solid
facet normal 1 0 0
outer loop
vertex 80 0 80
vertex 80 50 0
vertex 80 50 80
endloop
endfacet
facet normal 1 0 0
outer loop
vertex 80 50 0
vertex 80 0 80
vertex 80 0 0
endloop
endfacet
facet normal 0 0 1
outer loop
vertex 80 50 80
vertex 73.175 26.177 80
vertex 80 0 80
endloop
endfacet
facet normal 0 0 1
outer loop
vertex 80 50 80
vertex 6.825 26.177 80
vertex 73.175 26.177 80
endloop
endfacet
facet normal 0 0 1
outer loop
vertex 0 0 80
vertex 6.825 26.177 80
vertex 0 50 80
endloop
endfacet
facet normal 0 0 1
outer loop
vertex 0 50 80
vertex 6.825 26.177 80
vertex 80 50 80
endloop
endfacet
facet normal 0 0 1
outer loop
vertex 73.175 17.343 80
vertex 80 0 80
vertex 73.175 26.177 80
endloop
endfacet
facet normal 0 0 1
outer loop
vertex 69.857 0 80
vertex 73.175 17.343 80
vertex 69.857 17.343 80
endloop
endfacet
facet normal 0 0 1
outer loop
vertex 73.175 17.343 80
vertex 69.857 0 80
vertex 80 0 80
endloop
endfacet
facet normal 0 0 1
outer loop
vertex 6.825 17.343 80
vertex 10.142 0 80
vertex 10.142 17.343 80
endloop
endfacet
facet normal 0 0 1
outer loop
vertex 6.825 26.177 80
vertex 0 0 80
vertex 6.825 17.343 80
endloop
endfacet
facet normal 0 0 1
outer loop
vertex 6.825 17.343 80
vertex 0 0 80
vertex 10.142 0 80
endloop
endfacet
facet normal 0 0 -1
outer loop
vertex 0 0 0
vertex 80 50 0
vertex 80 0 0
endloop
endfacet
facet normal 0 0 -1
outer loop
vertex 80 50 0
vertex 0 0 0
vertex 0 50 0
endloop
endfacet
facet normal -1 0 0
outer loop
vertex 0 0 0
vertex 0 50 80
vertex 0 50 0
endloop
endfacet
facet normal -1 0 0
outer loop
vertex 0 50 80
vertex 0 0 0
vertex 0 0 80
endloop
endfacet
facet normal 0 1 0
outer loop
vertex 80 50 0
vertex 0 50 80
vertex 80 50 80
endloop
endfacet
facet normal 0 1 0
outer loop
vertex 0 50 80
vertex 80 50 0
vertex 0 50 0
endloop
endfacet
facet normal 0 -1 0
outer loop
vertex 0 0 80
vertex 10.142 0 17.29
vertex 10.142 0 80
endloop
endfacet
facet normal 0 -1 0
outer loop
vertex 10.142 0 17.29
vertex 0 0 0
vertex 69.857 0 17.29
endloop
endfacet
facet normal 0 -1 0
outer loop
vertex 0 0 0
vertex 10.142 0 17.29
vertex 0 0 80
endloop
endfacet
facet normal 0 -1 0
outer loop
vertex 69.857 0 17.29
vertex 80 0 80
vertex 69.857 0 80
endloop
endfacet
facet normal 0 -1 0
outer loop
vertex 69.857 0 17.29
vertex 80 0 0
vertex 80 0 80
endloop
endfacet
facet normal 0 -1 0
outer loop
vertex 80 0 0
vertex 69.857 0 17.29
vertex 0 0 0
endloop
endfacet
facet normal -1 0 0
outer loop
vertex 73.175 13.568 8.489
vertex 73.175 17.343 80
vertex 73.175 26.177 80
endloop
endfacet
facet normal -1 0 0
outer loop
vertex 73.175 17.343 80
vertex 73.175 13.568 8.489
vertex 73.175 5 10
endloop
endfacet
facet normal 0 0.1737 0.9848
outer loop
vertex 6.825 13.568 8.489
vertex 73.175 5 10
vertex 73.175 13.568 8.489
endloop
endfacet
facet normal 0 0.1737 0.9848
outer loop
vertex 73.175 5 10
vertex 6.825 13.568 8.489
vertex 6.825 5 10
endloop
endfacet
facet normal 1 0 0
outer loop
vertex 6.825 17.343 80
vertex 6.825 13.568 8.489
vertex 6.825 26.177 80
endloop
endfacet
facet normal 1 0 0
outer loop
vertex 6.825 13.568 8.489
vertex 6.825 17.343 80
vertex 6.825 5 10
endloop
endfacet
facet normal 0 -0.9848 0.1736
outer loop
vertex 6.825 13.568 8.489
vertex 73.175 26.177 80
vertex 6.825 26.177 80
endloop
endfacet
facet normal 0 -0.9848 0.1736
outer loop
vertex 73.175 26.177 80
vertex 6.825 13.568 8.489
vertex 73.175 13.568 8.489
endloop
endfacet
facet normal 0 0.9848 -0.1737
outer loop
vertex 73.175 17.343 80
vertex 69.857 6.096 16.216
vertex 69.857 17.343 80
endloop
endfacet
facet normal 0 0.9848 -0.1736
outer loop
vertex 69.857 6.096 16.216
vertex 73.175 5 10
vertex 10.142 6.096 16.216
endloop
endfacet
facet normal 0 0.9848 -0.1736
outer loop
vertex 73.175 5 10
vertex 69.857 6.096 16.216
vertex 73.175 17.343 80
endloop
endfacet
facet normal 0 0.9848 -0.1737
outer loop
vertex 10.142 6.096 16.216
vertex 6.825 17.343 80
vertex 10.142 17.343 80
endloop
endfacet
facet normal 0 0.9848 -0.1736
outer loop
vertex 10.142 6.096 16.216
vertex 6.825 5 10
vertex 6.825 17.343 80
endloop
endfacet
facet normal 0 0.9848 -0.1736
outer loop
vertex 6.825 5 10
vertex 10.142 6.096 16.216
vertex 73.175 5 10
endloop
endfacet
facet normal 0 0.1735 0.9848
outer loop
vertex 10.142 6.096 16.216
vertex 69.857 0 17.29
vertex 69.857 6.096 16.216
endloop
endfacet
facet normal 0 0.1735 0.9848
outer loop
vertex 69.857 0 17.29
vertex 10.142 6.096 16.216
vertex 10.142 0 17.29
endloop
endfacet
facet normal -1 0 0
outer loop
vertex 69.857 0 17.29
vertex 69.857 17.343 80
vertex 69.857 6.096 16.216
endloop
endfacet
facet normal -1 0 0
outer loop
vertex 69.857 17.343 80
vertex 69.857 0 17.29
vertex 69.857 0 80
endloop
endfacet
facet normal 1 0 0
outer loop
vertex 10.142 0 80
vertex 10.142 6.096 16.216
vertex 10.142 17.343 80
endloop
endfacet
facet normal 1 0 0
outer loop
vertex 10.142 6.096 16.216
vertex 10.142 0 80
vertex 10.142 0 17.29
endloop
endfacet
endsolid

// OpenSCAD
// [FL_INDEX: keywords="openscad, 3d_parametric, Customizable_Universal_Phone_Stand, csg_solid" | COT="Parametric OpenSCAD design from 3DCodeverse"]
// Title: Customizable Universal Phone Stand

//Customizable Phone Stand
//Height of the phone //default 125.45
phone_height = 125.45;
//Width of the phone //default 66.35
phone_width = 66.35; 
//Thickness of the phone //default 8.7
phone_thickness = 8.7;  

//Height of the stand //default 80
stand_height = 80; //[30:120]
//Width of the stand //default 80
stand_width = 80; //[60:200]
//Thickness of the stand //default 50
stand_thickness = 50; //[35:100]

//Angle at which the phone stands //default 350
phone_stand_angle = 350; //[335:360]
//The height from the bottom of the stand, to where the phone begins //default 10
phone_stand_min_height = 10; //[2:60]
//From the front of the stand to where the phone starts //default 5
phone_stand_to_back = 5; //[2 : 20]
//to hold back the phone //default 0.9
holdback = 0.9;
//not used at this time
holdback_multiplier = 10; 

//Make!
phone_stand();

module phone_stand(){
  difference(){
    cube([stand_width,stand_thickness,stand_height]);
    //The Phone
    translate([stand_width/2 - phone_width/2,phone_stand_to_back,phone_stand_min_height]) 
    rotate(phone_stand_angle,[1,0,0]) 
    cube([phone_width,phone_thickness,phone_height]);
    //The Holdback
    translate([stand_width/2 - phone_width*holdback/2,phone_stand_to_back+(phone_thickness/2)-(phone_thickness*5*holdback),phone_stand_min_height + phone_height - (phone_height*holdback)]) 
    rotate(phone_stand_angle,[1,0,0]) 
    cube([phone_width*holdback,phone_thickness*5*holdback,phone_height*holdback]);
  }
}
